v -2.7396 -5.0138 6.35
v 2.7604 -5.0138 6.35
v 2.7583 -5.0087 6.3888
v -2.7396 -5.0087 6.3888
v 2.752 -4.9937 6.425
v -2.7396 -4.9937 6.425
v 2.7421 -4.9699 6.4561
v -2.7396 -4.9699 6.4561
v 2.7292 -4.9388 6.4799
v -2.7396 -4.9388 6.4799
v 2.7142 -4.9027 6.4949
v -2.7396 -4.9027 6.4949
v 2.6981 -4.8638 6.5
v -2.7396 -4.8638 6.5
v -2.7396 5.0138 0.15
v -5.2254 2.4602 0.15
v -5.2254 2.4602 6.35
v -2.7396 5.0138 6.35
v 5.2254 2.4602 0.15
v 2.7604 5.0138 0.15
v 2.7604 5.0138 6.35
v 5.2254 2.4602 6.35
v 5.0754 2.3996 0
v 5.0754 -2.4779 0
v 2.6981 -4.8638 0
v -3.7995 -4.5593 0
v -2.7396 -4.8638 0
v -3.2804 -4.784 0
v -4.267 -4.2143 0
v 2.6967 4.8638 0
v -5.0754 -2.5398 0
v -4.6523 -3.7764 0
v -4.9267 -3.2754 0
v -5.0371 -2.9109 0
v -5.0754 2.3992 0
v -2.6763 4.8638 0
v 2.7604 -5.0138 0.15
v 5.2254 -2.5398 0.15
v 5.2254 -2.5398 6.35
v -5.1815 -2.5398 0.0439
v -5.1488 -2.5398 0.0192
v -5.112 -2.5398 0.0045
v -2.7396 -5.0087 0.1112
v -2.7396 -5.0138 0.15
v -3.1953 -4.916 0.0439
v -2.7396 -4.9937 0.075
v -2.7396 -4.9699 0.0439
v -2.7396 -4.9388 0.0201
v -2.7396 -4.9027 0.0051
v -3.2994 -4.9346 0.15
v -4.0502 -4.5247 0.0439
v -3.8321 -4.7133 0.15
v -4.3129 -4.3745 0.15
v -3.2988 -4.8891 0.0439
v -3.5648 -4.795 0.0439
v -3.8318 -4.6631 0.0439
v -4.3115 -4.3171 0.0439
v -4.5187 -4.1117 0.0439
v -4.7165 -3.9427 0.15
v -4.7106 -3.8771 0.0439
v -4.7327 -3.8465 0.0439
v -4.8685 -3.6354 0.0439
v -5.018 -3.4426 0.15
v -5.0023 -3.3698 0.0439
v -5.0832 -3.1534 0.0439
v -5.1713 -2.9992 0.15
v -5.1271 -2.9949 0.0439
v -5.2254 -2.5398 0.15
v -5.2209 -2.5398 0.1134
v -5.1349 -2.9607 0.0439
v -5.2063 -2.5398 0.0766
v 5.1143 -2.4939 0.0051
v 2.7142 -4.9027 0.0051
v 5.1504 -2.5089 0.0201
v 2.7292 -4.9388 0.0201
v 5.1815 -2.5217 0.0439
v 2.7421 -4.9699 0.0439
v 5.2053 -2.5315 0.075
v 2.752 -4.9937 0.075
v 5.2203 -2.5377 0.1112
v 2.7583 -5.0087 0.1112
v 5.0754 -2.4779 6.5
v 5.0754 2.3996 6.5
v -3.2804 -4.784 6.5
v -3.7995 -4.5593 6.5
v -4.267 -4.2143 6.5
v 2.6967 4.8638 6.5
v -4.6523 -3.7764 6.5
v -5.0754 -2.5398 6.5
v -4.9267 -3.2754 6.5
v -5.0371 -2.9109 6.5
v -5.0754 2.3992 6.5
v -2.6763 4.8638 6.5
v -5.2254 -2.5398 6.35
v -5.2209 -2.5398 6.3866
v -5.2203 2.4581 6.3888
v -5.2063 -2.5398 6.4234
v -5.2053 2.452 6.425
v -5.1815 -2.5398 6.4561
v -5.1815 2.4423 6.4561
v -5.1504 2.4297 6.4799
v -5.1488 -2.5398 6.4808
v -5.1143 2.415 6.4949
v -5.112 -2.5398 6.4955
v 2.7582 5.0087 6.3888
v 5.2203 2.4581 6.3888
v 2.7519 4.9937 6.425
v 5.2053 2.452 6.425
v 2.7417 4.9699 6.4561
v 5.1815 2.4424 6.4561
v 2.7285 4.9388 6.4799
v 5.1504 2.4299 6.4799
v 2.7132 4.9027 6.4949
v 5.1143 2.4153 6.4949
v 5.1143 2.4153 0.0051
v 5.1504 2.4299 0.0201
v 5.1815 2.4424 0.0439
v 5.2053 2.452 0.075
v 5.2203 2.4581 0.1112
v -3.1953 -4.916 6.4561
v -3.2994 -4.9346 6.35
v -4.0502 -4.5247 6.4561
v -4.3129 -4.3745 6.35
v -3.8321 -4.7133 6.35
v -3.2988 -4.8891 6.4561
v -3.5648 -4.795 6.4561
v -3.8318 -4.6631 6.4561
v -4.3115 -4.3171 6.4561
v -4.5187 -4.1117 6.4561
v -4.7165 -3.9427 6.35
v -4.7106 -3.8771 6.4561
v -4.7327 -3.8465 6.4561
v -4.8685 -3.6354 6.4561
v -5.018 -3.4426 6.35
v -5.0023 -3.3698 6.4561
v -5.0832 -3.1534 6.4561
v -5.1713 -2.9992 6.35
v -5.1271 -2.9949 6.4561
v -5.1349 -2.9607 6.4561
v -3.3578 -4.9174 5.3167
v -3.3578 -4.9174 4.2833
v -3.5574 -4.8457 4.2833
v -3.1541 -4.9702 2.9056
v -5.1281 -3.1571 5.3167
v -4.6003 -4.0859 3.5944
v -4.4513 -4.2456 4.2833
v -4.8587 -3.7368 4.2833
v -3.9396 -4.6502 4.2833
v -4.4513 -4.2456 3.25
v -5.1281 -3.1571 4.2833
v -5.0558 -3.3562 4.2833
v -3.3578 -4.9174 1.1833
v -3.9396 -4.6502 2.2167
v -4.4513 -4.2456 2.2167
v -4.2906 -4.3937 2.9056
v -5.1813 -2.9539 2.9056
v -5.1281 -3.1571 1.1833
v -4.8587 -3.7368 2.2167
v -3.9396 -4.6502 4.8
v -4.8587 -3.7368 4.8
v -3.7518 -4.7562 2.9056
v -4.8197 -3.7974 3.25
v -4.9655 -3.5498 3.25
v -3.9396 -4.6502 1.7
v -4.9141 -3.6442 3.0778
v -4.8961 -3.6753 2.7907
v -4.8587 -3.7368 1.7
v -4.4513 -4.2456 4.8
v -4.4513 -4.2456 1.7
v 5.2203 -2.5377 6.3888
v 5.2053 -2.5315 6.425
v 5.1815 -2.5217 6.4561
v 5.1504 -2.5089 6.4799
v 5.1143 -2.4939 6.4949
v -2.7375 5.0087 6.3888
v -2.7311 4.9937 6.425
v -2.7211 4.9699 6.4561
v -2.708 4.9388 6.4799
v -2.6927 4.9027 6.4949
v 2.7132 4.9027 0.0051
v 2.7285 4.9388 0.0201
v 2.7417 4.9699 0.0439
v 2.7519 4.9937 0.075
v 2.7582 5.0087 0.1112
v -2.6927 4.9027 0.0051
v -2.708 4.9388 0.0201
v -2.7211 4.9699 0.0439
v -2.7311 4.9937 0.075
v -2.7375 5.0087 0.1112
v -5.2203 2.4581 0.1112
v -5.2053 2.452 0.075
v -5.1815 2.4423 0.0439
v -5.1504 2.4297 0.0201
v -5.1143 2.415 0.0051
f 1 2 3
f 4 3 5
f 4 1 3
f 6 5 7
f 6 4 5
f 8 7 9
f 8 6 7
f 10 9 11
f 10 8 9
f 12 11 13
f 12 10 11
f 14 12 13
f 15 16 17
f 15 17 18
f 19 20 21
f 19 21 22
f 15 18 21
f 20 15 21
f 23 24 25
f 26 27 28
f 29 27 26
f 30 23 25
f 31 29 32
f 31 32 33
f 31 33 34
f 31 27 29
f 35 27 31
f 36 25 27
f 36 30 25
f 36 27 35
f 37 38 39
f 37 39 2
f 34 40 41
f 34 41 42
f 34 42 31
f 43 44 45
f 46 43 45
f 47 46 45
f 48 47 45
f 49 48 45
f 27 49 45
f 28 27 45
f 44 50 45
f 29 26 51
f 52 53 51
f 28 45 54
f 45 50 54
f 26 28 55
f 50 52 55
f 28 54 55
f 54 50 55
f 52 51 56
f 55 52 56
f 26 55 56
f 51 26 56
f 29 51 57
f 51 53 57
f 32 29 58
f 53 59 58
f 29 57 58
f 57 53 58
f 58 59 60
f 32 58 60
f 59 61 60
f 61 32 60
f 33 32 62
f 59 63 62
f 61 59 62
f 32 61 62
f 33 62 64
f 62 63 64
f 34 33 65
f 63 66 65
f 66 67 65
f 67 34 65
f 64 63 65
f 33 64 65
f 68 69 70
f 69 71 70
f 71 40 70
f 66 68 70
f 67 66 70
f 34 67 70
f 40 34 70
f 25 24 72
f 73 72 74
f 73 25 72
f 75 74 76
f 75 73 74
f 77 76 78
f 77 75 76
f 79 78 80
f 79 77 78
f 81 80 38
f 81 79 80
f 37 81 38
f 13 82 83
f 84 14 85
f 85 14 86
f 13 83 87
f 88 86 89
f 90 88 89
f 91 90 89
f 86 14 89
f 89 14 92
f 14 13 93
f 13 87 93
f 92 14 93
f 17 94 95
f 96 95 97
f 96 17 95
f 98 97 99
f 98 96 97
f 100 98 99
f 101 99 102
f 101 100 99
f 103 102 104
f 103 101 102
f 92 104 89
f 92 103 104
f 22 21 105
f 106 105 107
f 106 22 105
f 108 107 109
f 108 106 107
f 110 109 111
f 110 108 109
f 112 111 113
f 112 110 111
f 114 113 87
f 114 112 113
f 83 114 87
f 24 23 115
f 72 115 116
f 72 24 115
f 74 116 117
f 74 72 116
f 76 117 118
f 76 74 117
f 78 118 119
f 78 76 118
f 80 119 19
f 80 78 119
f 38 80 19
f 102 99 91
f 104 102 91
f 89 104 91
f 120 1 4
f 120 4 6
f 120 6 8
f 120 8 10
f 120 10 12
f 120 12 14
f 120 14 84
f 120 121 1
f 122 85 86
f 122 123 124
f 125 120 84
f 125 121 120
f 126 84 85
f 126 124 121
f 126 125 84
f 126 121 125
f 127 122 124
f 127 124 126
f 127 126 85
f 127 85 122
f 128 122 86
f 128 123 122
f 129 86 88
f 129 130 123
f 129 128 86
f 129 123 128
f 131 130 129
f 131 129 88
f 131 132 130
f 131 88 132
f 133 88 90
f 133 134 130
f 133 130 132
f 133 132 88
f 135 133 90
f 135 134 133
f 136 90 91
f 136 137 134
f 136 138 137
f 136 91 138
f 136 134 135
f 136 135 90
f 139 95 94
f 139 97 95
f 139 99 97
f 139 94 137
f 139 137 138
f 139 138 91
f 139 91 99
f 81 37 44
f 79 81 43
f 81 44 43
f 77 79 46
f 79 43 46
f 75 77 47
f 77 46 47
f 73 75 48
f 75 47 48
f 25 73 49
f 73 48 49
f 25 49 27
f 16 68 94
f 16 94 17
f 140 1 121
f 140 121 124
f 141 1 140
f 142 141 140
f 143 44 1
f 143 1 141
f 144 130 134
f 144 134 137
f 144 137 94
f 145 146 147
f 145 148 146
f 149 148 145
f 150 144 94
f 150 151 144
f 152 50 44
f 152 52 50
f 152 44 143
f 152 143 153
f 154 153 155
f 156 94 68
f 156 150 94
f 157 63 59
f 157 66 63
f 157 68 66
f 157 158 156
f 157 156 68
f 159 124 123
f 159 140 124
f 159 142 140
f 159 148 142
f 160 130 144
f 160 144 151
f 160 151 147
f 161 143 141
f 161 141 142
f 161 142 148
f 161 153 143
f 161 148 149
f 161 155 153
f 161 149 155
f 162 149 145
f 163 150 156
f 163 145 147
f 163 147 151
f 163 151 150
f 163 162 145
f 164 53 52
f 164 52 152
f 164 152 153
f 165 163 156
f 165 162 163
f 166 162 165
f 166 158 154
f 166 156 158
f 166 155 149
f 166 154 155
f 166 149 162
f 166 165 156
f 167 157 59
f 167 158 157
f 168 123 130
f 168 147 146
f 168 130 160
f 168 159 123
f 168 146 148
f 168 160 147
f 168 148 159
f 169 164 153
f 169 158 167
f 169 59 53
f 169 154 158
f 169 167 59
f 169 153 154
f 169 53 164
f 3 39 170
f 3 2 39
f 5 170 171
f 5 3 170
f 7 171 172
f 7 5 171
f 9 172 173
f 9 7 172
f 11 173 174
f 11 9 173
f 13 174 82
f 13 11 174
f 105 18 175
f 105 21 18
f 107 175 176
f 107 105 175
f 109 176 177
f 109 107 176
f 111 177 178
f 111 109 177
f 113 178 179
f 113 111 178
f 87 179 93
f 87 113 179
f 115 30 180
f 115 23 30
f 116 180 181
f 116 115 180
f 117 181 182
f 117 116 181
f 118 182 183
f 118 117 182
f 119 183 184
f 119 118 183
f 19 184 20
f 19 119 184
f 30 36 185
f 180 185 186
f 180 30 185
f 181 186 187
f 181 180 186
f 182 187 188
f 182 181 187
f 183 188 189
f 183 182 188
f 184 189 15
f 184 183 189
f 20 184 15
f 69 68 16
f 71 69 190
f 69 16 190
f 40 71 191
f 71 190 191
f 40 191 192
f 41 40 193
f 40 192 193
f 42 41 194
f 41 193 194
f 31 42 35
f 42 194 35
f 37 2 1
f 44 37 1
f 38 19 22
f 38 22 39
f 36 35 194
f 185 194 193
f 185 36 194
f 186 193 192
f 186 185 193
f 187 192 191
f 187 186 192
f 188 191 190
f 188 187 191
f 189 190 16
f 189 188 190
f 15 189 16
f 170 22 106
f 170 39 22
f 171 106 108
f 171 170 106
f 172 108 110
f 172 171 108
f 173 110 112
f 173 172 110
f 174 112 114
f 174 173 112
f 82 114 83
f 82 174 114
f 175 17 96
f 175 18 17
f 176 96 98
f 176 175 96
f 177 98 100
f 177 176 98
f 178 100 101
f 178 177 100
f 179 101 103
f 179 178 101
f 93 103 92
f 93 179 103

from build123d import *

# Parameters (mm, degrees)
PAD_DEPTH   = 6.5
FILLET_R    = 0.15
FILLET001_R = 0.15


with BuildPart() as part:
    # Sketch → Pad (new body)
    with BuildSketch(Plane.XY):
        with BuildLine():
            Line((-5.22543, -2.53984), (-5.22543, 2.46016))
            Line((-5.22543, 2.46016), (-2.73961, 5.013846))
            Line((-2.73961, 5.013846), (2.76039, 5.013846))
            Line((2.76039, 5.013846), (5.22543, 2.46016))
            Line((5.22543, 2.46016), (5.22543, -2.53984))
            Line((5.22543, -2.53984), (2.76039, -5.013846))
            Line((2.76039, -5.013846), (-2.73961, -5.013846))
            add(Edge.make_bspline(
                [(-2.73961, -5.013846), (-3.98961, -5.013846), (-5.22543, -3.78984), (-5.22543, -2.53984)],
                knots=[0, 0, 0, 0, 1, 1, 1, 1], degree=3))
        make_face()
    extrude(amount=PAD_DEPTH)

    # Fillet
    fillet_edges = [part.edges().sort_by_distance(p)[0] for p in [
        (-5.22543, -0.03984, 6.5),
        (-3.98252, 3.737003, 6.5),
        (0.01039, 5.013846, 6.5),
        (3.99291, 3.737003, 6.5),
        (5.22543, -0.03984, 6.5),
        (3.99291, -3.776843, 6.5),
        (0.01039, -5.013846, 6.5),
        (-4.450502, -4.246356, 6.5),
    ]]
    fillet(fillet_edges, radius=FILLET_R)

    # Fillet001
    fillet001_edges = [part.edges().sort_by_distance(p)[0] for p in [
        (-5.22543, -0.03984, 0),
        (-3.98252, 3.737003, 0),
        (0.01039, 5.013846, 0),
        (3.99291, 3.737003, 0),
        (5.22543, -0.03984, 0),
        (3.99291, -3.776843, 0),
        (0.01039, -5.013846, 0),
        (-4.450502, -4.246356, 0),
    ]]
    fillet(fillet001_edges, radius=FILLET001_R)


solid = part.part
